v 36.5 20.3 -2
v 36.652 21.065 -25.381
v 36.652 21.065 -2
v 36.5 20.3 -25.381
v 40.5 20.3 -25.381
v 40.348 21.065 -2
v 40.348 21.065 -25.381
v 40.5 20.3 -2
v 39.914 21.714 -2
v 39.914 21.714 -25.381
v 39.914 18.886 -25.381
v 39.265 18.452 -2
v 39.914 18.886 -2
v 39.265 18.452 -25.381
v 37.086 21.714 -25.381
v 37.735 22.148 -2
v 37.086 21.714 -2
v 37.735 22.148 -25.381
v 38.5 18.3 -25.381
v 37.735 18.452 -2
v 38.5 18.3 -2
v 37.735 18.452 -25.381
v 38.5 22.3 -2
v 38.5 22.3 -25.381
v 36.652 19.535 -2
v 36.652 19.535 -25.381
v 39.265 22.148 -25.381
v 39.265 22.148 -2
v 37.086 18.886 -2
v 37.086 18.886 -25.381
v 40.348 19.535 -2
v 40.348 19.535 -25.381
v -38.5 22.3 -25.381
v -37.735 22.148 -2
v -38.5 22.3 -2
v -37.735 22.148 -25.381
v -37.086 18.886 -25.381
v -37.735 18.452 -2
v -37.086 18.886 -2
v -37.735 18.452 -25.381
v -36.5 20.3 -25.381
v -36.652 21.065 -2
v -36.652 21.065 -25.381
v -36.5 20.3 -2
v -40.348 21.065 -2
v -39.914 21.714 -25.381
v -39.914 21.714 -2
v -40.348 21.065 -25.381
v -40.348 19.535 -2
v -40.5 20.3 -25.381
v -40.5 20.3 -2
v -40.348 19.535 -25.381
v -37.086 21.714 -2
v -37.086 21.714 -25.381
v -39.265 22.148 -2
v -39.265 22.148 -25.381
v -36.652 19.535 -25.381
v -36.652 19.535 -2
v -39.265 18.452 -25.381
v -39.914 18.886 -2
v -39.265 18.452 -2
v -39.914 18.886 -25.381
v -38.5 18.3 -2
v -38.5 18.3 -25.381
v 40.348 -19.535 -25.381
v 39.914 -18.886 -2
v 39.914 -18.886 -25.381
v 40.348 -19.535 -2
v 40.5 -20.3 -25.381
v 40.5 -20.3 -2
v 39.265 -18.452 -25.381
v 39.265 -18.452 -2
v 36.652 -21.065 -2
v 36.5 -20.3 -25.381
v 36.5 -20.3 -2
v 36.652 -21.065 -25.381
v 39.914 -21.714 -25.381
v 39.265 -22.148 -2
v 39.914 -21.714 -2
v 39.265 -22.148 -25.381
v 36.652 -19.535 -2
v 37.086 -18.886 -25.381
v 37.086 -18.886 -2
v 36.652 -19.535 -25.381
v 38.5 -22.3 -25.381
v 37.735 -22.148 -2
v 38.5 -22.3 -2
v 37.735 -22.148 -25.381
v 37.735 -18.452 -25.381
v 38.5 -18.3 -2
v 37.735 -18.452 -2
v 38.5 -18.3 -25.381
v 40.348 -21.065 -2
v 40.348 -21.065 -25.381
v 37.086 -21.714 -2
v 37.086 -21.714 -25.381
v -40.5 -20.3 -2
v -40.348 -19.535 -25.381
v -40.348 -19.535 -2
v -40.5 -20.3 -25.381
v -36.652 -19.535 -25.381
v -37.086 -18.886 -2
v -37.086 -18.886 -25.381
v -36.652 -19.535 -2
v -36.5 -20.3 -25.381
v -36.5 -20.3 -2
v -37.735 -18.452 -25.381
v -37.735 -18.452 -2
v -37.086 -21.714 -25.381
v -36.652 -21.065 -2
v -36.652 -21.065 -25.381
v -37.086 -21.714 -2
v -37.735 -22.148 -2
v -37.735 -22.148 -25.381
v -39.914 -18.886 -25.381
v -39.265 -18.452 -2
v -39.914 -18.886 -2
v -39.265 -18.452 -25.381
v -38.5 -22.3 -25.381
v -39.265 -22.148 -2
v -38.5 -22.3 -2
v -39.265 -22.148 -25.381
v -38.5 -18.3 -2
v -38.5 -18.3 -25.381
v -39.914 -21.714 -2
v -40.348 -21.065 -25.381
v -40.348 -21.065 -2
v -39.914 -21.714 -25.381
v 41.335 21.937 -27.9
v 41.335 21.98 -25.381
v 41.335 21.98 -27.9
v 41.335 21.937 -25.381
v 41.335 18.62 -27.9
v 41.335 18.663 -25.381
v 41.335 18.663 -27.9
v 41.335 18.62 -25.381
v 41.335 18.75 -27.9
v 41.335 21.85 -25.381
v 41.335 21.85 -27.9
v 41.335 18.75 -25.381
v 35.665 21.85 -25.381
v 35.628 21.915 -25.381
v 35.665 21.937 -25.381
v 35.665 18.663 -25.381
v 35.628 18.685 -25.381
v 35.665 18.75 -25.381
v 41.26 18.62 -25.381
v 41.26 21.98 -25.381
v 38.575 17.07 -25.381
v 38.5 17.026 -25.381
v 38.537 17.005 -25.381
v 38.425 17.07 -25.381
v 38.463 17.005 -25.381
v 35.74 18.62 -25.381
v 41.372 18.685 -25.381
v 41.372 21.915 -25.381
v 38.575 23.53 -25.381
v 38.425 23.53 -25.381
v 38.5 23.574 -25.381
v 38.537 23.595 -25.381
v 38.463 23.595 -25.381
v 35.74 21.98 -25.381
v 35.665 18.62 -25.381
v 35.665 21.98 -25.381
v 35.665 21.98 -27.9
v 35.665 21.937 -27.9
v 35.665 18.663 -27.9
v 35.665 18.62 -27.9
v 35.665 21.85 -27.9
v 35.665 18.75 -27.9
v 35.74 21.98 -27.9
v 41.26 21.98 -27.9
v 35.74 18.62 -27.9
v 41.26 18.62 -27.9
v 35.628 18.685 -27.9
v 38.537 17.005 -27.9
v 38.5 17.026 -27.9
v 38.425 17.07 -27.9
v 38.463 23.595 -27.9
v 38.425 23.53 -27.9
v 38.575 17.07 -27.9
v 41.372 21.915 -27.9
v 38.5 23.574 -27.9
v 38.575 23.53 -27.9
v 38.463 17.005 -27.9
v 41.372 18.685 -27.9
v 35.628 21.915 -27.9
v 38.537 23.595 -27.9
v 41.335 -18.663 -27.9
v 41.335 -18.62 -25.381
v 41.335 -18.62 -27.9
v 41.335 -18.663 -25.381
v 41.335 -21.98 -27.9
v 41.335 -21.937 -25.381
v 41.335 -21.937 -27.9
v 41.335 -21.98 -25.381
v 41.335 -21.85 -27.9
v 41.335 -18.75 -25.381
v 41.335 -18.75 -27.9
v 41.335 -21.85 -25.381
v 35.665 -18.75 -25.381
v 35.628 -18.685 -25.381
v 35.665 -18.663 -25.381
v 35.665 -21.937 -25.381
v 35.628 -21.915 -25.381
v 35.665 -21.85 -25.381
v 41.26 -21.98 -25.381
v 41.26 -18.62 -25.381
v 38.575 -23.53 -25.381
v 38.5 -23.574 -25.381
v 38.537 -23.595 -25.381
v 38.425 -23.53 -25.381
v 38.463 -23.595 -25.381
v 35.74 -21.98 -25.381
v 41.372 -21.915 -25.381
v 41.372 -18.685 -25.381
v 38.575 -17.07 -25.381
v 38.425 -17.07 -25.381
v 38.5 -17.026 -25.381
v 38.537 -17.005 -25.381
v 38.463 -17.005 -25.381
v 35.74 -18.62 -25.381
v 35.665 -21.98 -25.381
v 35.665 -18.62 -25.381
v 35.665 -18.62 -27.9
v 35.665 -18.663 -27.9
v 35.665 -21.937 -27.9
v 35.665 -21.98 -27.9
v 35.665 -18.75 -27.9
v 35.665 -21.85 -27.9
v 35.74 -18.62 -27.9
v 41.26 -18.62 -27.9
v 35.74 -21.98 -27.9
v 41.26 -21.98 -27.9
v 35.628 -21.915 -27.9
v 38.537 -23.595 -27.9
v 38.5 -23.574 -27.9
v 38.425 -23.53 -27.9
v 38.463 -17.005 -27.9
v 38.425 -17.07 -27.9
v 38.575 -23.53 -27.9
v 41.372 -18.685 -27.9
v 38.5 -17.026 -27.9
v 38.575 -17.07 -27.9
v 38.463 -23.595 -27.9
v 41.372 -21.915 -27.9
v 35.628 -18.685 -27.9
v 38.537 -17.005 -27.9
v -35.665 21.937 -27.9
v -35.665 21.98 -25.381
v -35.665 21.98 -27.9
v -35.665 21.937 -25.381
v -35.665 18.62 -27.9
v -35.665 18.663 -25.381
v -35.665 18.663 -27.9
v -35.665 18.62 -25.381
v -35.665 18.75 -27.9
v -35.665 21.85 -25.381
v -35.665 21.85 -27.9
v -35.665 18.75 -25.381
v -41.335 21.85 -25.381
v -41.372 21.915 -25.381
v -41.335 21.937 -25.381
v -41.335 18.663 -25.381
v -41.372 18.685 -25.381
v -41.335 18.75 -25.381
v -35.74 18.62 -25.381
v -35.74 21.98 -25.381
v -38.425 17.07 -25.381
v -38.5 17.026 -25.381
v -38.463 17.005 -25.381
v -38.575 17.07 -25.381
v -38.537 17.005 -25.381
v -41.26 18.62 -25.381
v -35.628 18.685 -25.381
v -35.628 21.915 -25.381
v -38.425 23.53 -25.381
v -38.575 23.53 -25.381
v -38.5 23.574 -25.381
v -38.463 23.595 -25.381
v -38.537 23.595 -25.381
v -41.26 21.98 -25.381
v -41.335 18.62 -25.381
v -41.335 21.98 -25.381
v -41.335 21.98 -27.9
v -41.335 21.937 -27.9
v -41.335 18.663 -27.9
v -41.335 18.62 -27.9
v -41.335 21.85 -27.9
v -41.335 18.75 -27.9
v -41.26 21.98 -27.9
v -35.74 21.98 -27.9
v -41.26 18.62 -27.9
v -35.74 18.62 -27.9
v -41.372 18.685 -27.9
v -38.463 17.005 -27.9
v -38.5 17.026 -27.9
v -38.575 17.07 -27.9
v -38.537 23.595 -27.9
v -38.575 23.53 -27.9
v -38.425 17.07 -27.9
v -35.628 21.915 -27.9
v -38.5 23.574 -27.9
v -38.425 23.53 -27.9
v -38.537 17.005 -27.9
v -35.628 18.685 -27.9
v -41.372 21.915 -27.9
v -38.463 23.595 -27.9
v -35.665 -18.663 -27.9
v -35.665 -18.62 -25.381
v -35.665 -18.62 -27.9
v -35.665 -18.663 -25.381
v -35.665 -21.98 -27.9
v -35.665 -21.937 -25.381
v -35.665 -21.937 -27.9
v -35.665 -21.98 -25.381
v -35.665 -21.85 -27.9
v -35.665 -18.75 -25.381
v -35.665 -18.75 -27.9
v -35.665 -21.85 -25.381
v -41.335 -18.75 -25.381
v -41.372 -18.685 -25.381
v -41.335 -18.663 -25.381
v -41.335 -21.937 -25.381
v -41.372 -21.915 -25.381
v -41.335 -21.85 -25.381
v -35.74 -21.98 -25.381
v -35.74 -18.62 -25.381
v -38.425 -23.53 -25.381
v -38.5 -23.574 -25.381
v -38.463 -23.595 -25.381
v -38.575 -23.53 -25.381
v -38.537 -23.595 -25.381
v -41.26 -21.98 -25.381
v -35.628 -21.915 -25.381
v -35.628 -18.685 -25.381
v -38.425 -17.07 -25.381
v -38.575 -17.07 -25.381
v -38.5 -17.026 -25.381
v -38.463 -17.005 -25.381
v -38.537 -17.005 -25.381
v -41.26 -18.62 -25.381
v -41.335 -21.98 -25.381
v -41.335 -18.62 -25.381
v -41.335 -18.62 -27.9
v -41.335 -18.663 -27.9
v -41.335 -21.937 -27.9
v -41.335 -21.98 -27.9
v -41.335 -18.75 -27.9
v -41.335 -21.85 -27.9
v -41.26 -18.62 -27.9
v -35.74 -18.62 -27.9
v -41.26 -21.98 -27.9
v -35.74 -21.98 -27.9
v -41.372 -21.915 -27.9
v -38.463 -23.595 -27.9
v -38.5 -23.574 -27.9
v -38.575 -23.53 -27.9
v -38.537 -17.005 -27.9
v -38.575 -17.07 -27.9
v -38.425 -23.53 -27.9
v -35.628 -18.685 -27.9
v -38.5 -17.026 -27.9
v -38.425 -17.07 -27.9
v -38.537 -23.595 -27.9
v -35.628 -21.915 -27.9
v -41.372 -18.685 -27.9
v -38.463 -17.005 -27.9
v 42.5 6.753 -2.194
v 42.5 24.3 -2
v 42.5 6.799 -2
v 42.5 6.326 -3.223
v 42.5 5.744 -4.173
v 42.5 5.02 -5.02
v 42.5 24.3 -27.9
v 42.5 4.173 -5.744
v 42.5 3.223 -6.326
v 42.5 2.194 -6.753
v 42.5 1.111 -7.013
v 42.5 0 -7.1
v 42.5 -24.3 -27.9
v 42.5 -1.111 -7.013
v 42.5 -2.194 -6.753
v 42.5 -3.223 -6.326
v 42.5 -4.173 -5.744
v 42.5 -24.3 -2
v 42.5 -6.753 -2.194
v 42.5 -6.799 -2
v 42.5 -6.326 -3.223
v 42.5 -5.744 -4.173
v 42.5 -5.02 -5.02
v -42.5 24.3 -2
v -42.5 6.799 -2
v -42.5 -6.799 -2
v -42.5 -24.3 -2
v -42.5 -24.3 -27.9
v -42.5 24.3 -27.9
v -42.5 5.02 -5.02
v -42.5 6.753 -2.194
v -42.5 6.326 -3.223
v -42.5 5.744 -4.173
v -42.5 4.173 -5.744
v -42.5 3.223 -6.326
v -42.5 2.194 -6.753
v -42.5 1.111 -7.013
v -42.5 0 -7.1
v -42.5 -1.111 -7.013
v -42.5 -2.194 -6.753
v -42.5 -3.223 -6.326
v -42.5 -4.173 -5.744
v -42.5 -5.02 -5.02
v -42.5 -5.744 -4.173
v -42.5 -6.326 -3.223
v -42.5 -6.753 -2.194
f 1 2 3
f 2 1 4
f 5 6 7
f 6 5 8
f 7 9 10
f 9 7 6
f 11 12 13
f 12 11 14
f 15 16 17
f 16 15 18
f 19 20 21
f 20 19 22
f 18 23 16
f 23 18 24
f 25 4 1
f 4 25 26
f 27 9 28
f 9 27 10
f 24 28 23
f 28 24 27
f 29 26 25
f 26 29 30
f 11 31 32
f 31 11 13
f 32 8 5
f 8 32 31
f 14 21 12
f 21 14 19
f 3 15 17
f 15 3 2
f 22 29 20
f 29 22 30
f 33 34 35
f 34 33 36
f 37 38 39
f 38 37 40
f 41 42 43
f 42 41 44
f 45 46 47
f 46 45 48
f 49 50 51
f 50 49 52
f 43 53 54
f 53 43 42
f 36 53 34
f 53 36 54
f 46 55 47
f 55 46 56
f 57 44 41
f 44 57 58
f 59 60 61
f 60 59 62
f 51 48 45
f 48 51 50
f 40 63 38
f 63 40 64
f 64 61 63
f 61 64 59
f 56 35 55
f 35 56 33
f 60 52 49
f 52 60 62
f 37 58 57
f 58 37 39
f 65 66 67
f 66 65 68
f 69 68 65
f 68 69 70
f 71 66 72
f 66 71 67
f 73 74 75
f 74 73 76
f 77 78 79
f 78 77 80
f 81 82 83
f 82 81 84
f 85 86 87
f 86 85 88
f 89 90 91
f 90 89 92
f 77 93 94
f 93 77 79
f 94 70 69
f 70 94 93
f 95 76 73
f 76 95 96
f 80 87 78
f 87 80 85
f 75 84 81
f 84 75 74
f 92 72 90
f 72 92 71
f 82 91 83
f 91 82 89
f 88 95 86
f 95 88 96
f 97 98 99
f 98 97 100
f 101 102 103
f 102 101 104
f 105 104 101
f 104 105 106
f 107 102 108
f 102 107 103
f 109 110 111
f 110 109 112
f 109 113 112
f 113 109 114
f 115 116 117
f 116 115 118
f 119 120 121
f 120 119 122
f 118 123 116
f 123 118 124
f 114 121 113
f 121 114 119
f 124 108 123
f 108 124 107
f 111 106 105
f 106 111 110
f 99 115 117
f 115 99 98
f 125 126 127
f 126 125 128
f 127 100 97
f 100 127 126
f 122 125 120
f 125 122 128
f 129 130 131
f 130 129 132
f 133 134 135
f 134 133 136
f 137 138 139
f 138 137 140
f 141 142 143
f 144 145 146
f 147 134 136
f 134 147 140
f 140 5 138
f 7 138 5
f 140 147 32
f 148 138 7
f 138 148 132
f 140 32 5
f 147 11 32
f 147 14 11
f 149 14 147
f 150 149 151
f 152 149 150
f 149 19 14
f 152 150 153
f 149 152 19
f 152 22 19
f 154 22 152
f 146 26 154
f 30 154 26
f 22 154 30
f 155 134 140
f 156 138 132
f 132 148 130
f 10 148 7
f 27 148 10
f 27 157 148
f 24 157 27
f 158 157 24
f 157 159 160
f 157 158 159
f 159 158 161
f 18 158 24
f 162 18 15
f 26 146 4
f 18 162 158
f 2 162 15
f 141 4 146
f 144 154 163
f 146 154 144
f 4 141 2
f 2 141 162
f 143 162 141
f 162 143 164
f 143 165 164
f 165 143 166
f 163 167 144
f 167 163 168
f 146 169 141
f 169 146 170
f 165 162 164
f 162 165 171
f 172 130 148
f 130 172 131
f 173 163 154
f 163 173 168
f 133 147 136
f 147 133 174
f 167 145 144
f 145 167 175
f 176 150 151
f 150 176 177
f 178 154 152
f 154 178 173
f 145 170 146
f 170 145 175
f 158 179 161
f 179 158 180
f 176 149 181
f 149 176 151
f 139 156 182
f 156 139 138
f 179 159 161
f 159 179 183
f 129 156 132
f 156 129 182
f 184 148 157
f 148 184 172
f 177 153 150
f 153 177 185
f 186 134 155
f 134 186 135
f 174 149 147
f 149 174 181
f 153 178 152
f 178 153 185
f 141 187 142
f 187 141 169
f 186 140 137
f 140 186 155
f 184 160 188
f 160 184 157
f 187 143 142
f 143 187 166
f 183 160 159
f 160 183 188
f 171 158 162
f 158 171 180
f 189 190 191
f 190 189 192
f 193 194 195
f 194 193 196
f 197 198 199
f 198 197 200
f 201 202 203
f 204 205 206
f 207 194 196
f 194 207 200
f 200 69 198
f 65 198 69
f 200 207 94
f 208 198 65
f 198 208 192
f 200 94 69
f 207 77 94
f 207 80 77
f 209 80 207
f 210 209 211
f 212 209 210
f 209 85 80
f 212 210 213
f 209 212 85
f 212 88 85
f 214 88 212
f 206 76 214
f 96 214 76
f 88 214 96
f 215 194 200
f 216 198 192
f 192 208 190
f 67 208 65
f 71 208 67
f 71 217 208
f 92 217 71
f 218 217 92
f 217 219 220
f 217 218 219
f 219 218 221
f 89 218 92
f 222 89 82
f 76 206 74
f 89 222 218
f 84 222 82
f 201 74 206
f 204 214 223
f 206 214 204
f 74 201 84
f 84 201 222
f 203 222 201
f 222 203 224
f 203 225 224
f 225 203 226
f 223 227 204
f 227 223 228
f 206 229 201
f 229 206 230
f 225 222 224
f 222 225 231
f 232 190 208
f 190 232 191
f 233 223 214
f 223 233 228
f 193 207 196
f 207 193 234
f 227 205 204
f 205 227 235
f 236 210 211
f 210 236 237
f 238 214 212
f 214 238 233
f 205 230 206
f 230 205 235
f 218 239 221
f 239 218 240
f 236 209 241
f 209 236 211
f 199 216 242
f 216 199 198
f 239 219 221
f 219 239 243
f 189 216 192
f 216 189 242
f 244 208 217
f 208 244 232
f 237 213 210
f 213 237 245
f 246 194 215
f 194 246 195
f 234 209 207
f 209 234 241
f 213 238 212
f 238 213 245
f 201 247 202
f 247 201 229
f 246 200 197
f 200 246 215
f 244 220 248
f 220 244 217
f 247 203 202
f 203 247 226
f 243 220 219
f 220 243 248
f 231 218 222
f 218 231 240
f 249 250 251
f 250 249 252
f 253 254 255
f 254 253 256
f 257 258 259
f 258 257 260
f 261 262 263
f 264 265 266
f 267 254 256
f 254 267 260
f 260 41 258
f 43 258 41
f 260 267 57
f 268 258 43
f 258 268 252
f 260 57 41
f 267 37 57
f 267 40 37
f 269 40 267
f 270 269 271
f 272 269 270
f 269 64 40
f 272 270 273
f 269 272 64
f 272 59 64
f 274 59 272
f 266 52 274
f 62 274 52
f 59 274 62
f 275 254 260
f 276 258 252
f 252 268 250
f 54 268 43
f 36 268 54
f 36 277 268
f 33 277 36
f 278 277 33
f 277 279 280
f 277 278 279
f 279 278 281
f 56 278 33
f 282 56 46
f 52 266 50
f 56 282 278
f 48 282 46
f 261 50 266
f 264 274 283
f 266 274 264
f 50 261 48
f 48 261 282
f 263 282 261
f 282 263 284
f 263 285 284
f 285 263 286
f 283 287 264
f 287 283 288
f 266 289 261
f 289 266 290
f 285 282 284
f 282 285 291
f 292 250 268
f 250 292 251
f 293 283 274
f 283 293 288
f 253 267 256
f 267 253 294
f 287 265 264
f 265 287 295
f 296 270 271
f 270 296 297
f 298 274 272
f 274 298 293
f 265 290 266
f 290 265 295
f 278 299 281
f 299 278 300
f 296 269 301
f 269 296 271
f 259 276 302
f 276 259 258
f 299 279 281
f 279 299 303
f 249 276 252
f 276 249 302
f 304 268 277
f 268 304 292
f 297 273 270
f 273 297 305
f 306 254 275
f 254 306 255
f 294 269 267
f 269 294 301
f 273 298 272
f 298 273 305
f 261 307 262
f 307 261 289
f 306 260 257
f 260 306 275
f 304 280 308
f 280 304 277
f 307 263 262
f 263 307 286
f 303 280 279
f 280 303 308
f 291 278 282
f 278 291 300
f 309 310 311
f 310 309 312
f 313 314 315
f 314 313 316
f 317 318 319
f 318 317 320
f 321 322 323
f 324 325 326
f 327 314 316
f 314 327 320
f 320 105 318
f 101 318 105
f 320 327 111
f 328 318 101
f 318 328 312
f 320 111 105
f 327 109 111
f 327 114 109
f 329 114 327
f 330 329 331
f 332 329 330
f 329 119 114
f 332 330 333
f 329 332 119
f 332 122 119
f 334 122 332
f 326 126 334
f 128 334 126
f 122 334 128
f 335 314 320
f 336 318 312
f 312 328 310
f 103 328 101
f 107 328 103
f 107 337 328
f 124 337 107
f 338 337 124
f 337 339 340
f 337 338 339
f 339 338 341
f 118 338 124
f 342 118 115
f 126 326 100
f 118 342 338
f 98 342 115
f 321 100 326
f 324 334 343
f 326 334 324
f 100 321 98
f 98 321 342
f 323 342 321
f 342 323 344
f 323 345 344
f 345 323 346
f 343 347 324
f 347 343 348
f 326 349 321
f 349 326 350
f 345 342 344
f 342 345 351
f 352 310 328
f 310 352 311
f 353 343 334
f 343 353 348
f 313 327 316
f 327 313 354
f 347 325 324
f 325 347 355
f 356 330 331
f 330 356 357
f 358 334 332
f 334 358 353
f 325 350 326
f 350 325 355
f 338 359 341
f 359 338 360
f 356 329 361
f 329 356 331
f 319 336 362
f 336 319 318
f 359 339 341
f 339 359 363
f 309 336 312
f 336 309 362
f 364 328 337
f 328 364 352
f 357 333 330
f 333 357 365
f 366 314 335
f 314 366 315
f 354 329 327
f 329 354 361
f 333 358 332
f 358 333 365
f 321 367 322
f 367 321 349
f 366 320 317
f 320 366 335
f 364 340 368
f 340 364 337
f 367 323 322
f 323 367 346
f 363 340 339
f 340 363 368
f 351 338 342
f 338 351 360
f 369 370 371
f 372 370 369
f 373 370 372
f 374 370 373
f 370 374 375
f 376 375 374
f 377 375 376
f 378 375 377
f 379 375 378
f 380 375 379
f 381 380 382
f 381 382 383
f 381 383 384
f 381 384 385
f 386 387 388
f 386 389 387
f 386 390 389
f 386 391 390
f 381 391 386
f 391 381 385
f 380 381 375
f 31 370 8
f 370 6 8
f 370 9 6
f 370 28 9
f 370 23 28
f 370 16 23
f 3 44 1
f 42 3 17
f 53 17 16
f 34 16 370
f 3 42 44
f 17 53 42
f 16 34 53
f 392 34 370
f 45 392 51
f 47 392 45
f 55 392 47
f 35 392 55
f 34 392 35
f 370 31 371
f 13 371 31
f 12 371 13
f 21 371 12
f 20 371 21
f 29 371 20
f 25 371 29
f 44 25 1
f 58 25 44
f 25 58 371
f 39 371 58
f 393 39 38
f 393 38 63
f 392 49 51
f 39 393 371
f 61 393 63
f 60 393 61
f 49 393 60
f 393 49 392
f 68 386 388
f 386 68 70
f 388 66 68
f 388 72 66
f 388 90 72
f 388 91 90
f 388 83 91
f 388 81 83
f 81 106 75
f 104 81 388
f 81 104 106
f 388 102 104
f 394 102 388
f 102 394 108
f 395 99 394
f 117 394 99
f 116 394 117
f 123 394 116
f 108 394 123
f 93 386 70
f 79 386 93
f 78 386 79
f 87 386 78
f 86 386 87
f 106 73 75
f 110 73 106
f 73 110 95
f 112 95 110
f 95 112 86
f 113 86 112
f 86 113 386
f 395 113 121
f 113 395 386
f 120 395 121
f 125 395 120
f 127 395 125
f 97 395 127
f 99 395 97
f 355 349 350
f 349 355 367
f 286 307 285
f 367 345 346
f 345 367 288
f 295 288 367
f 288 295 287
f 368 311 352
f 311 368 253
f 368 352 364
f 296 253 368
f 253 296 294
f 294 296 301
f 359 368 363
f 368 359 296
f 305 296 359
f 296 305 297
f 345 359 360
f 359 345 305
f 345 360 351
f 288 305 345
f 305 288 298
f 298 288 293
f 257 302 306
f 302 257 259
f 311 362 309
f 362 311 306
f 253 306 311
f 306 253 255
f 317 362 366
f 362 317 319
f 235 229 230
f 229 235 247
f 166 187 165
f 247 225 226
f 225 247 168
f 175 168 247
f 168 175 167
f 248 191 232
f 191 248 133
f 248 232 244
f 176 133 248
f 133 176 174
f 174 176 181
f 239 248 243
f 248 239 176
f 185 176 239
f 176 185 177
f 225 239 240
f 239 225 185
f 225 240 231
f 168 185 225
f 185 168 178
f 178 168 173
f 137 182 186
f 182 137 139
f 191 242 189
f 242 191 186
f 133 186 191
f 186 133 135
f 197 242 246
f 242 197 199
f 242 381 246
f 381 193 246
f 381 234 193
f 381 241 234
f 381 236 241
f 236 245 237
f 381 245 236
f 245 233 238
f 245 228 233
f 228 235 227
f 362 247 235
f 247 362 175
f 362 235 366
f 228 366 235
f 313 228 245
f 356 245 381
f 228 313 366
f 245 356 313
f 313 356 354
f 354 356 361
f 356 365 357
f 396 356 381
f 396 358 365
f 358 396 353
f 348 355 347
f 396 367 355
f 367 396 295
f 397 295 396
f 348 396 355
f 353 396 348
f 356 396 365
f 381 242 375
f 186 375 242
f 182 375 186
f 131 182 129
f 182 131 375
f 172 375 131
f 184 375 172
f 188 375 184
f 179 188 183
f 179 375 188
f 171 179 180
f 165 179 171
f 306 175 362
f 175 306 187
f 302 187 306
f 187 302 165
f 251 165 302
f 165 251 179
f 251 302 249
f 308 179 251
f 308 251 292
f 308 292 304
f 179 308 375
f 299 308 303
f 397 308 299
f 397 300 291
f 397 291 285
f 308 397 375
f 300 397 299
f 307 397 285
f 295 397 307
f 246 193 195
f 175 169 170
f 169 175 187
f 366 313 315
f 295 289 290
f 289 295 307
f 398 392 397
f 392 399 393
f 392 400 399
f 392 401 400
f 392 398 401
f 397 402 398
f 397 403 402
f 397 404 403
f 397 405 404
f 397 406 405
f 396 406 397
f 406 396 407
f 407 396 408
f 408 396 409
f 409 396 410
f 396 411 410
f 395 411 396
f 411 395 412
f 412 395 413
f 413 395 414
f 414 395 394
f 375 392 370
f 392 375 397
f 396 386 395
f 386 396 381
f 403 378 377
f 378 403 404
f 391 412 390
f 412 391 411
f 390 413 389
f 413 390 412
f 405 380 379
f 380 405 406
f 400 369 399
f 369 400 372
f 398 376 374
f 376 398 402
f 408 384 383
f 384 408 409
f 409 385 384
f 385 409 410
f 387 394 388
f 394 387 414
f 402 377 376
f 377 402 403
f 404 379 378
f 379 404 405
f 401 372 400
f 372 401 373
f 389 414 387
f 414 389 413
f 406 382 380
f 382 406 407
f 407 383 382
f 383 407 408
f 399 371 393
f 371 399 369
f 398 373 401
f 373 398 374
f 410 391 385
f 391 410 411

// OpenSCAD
// file: bolt.scad
include <variables.scad>

bolt();

module bolt() {
	color("Silver")
	union() {
		for (i = [0:2]) {
			rotate([0, 0, 180/3*i])
			cube([boltWidth, boltSegmentWidth, boltHeight],center=true);
		}
	}
}
// file: variables.scad
innerWidth = 38;
innerLength = 80;
innerHeight = 25;
minEdgeWidth = 2.5;
largeEdgeWidth = 6;
holeRadius = 2;
boxSpacing = 4;
stickRadius = 7.1; // fixed by table

sensorScrewHoleRadius = 2.5/2;

// PCBVariables
	PCBWidth = 35.2;
	PCBBoardLength = 70;
	PCBLength = 80;// 70;
	PCBHeight = 1.5;
	PCBBoardToBoardHeight = 13.9; // height of the two layers of pcb and the pinheaders between them
	
	PCBToBottomSpacing = 3; // space for wires on bottom of PCB
	PCBToTopSpacing = 2; // Air gap between pcb components and stick
	PCBNotchWidth = 1.5; // user definable
	PCBComponentsHeight = 17.1-PCBBoardToBoardHeight; // Height of pCB components on top of top layer pcb

	PCBSensorBoardLength = 15.75;
	PCBSensorBoardWidth = 21;
	PCBSensorBoardOverhang = 7.4; // The length of sensor board that overhangs the main print board
	PCBSensorBoardYOffset = -1.5/2;
	PCBSensorBoardHoleRadius = 1.5;
	PCBSensorBoardHoleCenterYDistance = 12.3+PCBSensorBoardHoleRadius*2;

// BatteryBoxVariables
	batteryRadius = 18.3/2;
	batteryLenght = 65;

// Bolts
	boltHeight = 2.4;
	boltWidth = 5.4;
	boltSegmentWidth = 3.2;

// Switch
	SwitchBaseLength = 9.8;
	SwitchBaseWidth = 13.1;
	SwitchBaseHeight = 8;

	SwitchCylinderRadius = 6/2;
	SwitchCylinderLength = 9;
	SwitchLegLength = 4;

// switch_alt
	SwitchAltWidth = 13;
	SwitchAltHeight = 6;
	SwitchAltDepth = 6;
	SwitchPinLength = 4;
	SwitchAltFlipperHeight = 7;


MaxLength = 85; // fixed by table
MinWidth = max(batteryRadius*4, PCBWidth)+2*largeEdgeWidth;
MinHeight = max(batteryRadius*2, PCBToTopSpacing+PCBComponentsHeight+PCBBoardToBoardHeight+PCBToBottomSpacing)+stickRadius+minEdgeWidth;
// main file
include <variables.scad>
use <bolt.scad>

CylinderPunchedBox(MaxLength, MinWidth, stickRadius-boxSpacing/2+batteryRadius*2+minEdgeWidth, holeRadius, holeRadius*2, true);

module HoledBox(length, width, height, holeRadius, holePadding, NutIndents) {
	difference() {
		cube([length, width, height], center = true);
		
		scale([1,1,1.001])
		union() { // subtractions
			// holes
			translate([
				 (length-holePadding-holeRadius*2)/2, 
				 (width-holePadding-holeRadius*2)/2, 
				-(height)/2])
			cylinder(height+.1, r=holeRadius, $fn=16);
			translate([
				-(length-holePadding-holeRadius*2)/2, 
				 (width-holePadding-holeRadius*2)/2, 
				-(height)/2])
			cylinder(height+.1, r=holeRadius, $fn=16);
			translate([
				 (length-holePadding-holeRadius*2)/2, 
				-(width-holePadding-holeRadius*2)/2, 
				-(height)/2])
			cylinder(height+.1, r=holeRadius, $fn=16);
			translate([
				-(length-holePadding-holeRadius*2)/2, 
				-(width-holePadding-holeRadius*2)/2, 
				-(height)/2])
			cylinder(height+.1, r=holeRadius, $fn=16);
		}

		if(NutIndents) {
			translate([0, 0, -(height-boltHeight+0.001)/2]) {
				translate([(length-holePadding-holeRadius*2)/2, (width-holePadding-holeRadius*2)/2, ])
				scale([1.05, 1.05, 1.1])
				bolt();
				translate([(length-holePadding-holeRadius*2)/2, -(width-holePadding-holeRadius*2)/2, ])
				scale([1.05, 1.05, 1.1])
				bolt();
				translate([-(length-holePadding-holeRadius*2)/2, (width-holePadding-holeRadius*2)/2, ])
				scale([1.05, 1.05, 1.1])
				bolt();
				translate([-(length-holePadding-holeRadius*2)/2, -(width-holePadding-holeRadius*2)/2, ])
				scale([1.05, 1.05, 1.1])
				bolt();
			}
		}
	}
}

module CylinderPunchedBox(length, width, height, holeRadius, holePadding, NutIndents) {
	difference() {
		translate([0, 0, -(height+boxSpacing)/2])
		HoledBox(length, width, height, holeRadius, holePadding, NutIndents);

		scale([1.001, 1, 1])
		rotate([0, 90, 0])
		cylinder((length), r=stickRadius, center=true, $fn=40);
	}
}
